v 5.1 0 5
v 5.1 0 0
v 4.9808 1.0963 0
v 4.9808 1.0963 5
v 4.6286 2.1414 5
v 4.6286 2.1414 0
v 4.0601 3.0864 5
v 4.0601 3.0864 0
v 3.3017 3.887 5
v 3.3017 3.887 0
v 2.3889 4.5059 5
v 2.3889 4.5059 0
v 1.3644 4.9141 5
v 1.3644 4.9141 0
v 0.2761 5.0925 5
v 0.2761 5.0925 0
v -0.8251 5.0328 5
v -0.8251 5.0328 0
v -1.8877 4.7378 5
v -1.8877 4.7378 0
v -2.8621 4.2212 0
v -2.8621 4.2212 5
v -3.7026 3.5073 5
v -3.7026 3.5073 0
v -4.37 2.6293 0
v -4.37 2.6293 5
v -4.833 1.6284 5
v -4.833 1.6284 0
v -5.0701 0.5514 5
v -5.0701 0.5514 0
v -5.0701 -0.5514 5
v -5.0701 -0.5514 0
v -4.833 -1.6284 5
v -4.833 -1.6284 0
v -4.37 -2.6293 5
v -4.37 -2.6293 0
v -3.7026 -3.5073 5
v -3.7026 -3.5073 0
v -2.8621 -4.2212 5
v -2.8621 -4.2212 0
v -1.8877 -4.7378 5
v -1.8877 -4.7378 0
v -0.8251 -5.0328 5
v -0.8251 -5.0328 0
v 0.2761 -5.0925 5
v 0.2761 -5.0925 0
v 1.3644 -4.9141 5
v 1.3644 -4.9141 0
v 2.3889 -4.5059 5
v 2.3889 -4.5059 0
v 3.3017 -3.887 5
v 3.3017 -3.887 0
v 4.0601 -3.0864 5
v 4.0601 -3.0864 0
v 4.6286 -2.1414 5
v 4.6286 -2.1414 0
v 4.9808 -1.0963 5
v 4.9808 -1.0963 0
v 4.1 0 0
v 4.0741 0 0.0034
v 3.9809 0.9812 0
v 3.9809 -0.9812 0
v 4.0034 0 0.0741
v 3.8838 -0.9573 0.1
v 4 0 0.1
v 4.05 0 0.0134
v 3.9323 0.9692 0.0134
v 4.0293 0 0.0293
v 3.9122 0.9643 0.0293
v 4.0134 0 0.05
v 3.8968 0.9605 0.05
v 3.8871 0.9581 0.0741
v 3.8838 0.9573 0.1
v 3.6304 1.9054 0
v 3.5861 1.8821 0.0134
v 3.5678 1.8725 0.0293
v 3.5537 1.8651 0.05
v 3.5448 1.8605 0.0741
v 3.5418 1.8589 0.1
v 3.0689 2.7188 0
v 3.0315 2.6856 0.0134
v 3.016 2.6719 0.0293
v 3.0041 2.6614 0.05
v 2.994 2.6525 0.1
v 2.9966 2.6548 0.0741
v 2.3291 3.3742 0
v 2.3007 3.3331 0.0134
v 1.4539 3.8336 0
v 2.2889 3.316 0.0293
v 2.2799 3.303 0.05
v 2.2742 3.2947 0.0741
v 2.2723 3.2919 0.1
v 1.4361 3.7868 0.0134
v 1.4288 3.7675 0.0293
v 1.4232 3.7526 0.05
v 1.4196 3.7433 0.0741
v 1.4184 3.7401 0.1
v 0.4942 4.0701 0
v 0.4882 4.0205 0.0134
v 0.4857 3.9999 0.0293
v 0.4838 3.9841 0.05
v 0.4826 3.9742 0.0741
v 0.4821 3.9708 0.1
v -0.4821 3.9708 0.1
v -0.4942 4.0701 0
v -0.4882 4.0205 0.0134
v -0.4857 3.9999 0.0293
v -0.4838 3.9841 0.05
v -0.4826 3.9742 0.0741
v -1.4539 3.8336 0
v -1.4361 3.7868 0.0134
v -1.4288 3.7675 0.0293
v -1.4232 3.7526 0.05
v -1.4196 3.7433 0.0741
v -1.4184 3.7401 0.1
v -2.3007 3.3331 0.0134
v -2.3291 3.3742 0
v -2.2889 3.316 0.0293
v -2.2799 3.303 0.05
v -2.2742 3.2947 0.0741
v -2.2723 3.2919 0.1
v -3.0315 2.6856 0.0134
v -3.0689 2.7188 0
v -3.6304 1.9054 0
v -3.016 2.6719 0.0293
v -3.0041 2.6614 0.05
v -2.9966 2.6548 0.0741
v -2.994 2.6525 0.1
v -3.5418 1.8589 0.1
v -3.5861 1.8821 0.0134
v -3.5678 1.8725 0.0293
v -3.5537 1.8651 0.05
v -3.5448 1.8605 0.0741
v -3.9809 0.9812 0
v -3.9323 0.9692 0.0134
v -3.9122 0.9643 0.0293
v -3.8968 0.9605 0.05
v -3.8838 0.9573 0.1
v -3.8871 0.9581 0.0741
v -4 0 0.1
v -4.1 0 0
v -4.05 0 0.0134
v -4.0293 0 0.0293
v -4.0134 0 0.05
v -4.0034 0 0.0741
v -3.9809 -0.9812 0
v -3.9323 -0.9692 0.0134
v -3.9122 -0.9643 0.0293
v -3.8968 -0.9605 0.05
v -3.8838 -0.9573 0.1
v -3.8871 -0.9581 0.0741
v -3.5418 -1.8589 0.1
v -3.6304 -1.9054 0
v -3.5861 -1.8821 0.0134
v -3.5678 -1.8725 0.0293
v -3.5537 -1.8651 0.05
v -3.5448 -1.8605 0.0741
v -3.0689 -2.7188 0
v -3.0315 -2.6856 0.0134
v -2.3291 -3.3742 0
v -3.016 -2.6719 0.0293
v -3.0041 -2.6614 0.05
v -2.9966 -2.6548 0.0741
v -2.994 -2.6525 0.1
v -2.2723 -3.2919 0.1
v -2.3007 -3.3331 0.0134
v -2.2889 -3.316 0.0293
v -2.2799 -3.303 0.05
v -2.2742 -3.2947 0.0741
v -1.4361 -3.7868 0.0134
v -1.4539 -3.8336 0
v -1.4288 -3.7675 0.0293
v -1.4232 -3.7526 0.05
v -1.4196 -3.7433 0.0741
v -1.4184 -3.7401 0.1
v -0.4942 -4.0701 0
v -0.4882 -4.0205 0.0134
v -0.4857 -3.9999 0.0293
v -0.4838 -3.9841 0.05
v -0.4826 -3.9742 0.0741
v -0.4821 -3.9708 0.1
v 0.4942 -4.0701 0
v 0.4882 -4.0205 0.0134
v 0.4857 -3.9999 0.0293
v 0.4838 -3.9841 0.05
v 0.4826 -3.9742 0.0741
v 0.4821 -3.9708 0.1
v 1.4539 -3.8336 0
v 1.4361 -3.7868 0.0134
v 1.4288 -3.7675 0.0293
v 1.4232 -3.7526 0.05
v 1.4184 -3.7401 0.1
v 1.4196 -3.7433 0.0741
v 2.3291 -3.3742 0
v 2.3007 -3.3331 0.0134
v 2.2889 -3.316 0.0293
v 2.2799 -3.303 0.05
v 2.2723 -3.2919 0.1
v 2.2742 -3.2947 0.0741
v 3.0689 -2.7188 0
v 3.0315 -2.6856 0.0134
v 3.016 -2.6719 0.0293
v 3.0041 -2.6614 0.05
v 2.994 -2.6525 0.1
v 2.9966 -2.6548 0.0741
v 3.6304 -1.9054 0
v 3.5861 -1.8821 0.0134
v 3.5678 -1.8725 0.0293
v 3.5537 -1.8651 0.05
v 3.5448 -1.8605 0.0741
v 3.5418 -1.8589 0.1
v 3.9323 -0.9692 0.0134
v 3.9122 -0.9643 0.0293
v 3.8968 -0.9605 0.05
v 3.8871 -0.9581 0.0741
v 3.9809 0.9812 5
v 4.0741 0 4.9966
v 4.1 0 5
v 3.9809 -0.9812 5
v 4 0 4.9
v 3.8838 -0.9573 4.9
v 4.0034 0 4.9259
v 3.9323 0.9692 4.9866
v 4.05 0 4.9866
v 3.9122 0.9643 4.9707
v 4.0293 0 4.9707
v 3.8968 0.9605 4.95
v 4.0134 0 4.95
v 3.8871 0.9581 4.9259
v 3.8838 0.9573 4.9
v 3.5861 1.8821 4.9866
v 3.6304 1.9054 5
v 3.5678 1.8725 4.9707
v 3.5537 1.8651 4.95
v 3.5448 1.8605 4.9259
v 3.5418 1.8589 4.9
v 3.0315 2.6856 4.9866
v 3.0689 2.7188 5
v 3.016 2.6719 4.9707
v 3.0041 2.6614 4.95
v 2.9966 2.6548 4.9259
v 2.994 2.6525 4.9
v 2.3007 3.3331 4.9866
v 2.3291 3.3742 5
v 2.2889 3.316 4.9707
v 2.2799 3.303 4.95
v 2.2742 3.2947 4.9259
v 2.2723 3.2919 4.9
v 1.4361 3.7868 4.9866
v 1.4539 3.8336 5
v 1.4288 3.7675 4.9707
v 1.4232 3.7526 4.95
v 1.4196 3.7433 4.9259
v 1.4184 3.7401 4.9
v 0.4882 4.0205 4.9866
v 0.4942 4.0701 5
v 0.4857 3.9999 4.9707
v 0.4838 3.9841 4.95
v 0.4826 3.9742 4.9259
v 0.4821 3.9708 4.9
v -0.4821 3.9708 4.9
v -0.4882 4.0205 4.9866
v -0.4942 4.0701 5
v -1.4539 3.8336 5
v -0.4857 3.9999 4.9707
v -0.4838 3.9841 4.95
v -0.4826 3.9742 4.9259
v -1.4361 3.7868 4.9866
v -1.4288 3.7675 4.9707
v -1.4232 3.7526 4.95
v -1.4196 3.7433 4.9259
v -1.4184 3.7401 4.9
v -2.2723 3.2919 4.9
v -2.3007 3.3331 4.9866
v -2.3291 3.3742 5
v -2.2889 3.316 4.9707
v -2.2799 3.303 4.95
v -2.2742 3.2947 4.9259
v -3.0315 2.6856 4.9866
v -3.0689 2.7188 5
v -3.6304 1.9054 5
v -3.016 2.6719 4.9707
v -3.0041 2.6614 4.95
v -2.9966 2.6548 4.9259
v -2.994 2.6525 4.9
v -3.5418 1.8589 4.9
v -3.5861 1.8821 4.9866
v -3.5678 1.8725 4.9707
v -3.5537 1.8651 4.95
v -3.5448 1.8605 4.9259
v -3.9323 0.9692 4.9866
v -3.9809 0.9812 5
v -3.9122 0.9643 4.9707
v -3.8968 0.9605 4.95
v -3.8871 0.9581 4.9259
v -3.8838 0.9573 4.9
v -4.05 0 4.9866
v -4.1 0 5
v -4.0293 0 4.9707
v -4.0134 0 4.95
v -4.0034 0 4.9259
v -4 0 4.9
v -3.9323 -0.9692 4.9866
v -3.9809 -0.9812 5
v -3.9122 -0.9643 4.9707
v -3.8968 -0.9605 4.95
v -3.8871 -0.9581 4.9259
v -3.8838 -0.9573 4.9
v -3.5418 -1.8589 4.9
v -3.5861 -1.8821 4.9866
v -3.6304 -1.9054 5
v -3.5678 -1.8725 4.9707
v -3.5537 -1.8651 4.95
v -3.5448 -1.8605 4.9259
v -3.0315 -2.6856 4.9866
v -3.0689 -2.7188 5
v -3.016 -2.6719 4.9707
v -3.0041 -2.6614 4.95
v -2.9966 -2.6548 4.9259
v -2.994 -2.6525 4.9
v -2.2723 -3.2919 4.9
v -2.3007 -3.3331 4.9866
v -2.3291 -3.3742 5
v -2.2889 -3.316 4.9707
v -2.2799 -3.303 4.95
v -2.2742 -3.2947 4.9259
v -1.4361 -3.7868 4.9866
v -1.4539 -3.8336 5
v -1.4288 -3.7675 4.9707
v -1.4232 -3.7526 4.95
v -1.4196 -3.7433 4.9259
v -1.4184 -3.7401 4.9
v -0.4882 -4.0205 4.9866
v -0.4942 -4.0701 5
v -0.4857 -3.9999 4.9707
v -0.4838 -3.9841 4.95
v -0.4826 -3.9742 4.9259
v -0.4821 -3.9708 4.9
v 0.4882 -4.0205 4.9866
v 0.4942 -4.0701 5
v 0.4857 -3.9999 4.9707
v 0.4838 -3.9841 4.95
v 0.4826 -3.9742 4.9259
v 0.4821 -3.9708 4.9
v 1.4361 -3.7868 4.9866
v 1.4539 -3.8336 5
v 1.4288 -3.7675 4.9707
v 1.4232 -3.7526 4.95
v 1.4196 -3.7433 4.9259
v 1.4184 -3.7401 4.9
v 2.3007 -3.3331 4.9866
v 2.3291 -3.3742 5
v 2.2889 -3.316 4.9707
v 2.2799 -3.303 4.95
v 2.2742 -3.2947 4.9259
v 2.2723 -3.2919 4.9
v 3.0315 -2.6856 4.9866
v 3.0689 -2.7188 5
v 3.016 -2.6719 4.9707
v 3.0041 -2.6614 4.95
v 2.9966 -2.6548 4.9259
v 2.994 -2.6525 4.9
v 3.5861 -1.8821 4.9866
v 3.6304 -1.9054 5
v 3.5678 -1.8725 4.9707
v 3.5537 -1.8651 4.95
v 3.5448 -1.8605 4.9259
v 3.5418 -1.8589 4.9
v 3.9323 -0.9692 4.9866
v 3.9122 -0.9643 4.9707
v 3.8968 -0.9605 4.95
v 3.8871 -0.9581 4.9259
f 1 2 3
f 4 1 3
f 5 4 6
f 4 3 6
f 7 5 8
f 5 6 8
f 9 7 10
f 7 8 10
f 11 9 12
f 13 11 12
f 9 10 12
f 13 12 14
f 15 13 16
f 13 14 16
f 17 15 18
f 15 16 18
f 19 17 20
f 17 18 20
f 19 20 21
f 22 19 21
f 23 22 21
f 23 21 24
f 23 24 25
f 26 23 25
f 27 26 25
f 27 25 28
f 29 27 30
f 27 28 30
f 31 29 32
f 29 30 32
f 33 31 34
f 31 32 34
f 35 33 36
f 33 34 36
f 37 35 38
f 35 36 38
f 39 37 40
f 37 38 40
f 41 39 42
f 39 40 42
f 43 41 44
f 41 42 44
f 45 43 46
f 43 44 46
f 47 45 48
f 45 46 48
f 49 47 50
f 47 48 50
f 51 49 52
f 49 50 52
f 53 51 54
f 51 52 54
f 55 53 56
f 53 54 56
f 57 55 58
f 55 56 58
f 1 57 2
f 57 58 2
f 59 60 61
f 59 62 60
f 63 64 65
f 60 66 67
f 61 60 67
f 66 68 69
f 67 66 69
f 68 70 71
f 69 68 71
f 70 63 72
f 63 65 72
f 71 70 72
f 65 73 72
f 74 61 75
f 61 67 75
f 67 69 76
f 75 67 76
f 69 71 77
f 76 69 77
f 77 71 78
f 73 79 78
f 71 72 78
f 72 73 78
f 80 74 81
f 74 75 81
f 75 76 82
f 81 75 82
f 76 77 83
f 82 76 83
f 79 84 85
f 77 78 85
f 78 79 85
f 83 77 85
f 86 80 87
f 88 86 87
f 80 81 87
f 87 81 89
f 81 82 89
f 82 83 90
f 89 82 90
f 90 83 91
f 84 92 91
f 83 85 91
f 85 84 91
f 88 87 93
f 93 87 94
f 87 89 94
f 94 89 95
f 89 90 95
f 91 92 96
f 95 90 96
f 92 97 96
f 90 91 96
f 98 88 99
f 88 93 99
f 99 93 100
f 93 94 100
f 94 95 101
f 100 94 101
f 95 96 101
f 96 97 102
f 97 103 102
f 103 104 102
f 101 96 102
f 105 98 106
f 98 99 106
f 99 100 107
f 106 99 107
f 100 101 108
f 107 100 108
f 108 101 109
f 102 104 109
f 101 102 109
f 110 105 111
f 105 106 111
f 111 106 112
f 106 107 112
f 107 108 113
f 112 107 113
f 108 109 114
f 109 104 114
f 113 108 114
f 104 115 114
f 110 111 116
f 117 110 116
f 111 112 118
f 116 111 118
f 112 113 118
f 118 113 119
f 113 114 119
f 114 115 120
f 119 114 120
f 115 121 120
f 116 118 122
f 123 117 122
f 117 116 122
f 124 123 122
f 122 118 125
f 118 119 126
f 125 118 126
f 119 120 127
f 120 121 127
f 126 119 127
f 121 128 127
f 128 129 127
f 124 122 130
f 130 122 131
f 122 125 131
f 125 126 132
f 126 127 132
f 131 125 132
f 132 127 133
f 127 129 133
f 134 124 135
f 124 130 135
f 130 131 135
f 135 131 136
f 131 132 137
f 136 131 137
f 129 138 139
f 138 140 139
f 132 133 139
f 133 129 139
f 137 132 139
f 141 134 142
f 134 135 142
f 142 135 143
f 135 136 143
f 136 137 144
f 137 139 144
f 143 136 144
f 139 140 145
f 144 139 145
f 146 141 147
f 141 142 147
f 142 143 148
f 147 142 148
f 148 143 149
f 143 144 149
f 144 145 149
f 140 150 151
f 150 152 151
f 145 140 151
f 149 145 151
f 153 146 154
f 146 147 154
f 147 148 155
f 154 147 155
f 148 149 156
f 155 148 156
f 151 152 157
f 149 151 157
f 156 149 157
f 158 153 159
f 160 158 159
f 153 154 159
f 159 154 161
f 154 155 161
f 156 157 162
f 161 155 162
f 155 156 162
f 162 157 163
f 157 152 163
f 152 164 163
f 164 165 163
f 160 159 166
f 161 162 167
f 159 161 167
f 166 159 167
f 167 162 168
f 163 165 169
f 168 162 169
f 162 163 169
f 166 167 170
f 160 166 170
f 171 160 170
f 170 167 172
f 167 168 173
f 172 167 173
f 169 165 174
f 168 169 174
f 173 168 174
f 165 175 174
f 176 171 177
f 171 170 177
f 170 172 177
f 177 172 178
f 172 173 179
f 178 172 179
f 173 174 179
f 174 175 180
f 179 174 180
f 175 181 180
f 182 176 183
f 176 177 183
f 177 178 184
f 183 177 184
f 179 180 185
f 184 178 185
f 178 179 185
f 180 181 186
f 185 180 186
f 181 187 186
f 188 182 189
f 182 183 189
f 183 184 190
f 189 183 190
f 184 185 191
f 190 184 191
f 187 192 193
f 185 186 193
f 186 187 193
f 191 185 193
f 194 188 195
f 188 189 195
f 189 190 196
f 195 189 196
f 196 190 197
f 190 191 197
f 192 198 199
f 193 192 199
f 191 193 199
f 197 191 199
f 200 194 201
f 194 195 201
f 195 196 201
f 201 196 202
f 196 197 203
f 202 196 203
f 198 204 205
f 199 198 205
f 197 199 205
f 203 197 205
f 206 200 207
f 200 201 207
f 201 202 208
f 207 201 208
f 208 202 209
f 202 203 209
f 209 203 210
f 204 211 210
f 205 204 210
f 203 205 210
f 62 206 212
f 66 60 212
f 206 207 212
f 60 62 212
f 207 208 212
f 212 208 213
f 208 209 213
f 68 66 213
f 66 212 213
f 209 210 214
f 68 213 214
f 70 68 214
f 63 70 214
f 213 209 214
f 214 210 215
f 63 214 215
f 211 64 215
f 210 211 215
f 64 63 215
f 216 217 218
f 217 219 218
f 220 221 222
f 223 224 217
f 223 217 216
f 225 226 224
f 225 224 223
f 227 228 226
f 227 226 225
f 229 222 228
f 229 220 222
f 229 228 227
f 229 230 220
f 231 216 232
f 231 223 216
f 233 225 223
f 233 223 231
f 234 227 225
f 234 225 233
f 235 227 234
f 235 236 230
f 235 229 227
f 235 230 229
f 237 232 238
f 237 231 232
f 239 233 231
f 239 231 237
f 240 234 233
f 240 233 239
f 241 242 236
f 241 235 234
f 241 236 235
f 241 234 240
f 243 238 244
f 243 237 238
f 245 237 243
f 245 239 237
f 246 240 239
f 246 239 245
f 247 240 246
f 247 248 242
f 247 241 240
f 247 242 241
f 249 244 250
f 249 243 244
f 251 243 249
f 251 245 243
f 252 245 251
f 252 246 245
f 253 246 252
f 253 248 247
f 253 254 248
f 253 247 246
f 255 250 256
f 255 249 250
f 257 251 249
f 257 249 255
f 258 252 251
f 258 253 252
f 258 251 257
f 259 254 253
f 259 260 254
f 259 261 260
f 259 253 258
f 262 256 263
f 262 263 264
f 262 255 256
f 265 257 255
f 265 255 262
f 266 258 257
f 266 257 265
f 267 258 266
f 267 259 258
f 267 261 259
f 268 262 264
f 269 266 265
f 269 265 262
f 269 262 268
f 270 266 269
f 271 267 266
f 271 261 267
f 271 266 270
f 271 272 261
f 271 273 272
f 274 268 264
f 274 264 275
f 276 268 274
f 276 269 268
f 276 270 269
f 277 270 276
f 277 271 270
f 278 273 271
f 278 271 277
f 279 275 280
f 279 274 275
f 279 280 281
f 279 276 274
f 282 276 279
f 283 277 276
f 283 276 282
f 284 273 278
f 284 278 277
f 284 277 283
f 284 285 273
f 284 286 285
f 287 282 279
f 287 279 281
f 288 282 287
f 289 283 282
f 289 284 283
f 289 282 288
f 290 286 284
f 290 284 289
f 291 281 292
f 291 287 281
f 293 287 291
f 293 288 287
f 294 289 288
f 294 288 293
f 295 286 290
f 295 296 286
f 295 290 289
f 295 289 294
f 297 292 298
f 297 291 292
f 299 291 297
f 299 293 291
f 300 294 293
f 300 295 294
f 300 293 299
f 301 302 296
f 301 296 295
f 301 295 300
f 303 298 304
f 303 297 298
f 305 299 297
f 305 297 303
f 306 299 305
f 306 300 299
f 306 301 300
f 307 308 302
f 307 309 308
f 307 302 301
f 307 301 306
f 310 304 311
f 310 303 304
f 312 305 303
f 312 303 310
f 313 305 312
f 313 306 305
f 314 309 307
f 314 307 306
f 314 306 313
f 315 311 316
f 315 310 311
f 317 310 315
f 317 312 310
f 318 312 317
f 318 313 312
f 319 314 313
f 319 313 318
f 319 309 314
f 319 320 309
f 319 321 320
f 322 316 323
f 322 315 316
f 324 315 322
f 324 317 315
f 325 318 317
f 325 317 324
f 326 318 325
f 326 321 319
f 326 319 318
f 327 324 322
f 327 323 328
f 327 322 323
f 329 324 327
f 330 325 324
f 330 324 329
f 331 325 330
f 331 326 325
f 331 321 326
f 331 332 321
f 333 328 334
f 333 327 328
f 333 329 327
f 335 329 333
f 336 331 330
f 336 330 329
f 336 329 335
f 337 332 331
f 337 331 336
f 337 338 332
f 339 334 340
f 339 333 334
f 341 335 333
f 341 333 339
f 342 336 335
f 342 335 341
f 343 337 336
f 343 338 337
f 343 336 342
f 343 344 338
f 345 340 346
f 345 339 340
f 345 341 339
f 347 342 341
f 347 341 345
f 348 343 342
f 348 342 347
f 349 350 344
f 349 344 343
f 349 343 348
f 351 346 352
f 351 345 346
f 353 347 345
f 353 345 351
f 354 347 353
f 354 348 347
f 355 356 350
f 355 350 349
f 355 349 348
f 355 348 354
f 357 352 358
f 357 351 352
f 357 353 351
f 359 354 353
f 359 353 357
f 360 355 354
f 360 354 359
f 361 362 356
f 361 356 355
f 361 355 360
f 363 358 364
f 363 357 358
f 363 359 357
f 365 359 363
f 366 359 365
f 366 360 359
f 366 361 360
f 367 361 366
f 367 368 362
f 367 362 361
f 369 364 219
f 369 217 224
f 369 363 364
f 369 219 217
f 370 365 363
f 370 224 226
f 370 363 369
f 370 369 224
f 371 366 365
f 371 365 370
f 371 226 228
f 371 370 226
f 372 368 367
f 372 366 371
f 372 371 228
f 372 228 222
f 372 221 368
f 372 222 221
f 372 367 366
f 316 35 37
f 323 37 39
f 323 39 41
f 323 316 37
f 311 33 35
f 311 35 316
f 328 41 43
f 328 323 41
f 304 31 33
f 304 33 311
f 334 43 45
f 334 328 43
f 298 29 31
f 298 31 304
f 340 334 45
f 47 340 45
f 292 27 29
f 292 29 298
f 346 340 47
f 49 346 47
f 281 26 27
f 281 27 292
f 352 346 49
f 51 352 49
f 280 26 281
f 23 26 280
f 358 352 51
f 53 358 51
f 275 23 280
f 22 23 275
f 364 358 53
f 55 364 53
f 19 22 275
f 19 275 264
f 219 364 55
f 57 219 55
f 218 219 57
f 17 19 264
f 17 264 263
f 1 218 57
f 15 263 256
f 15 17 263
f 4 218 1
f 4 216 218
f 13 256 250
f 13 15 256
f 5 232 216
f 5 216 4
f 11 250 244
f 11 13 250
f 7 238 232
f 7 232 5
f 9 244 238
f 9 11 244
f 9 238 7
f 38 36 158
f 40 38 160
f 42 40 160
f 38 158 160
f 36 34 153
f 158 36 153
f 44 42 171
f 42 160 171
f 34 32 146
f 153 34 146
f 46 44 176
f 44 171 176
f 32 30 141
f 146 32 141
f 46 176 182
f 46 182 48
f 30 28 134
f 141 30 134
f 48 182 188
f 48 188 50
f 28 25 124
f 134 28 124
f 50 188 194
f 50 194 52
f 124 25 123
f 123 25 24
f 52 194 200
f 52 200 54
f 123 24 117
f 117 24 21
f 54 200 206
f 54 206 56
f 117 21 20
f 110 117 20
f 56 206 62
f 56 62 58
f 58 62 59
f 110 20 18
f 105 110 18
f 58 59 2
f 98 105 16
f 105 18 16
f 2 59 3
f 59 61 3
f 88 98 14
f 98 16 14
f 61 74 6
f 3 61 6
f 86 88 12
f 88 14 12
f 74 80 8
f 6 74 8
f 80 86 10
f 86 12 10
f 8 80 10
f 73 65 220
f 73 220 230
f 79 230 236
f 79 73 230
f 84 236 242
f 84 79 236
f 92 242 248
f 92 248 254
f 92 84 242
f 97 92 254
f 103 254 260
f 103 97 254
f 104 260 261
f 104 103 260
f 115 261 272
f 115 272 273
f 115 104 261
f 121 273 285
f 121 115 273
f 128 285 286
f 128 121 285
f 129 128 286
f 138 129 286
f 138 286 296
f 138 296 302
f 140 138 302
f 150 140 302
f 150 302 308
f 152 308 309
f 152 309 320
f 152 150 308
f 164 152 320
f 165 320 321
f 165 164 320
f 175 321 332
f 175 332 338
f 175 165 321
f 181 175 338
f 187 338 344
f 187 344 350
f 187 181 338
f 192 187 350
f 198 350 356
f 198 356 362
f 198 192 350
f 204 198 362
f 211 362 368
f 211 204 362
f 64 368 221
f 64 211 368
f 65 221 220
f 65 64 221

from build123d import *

# Parameters (mm, degrees)
CYLINDER001_R     = 4
CYLINDER001_DEPTH = 5
CYLINDER003_R     = 5.1
CYLINDER003_DEPTH = 5
FILLET_R          = 0.1


with BuildPart() as interior:
    # Cylinder001 → Cylinder001 (new body)
    with BuildSketch(Plane.XY):
        Circle(CYLINDER001_R)
    extrude(amount=CYLINDER001_DEPTH)


with BuildPart() as fillet_body:
    # Cylinder003 → Cylinder003 (new body)
    with BuildSketch(Plane.XY):
        Circle(CYLINDER003_R)
    extrude(amount=CYLINDER003_DEPTH)

    # Cut001: cut Interior
    add(interior.part, mode=Mode.SUBTRACT)

    # Fillet
    fillet_edges = [fillet_body.edges().sort_by_distance(p)[0] for p in [
        (-4, 0, 0),
        (-4, 0, 5),
    ]]
    fillet(fillet_edges, radius=FILLET_R)


solid = fillet_body.part
